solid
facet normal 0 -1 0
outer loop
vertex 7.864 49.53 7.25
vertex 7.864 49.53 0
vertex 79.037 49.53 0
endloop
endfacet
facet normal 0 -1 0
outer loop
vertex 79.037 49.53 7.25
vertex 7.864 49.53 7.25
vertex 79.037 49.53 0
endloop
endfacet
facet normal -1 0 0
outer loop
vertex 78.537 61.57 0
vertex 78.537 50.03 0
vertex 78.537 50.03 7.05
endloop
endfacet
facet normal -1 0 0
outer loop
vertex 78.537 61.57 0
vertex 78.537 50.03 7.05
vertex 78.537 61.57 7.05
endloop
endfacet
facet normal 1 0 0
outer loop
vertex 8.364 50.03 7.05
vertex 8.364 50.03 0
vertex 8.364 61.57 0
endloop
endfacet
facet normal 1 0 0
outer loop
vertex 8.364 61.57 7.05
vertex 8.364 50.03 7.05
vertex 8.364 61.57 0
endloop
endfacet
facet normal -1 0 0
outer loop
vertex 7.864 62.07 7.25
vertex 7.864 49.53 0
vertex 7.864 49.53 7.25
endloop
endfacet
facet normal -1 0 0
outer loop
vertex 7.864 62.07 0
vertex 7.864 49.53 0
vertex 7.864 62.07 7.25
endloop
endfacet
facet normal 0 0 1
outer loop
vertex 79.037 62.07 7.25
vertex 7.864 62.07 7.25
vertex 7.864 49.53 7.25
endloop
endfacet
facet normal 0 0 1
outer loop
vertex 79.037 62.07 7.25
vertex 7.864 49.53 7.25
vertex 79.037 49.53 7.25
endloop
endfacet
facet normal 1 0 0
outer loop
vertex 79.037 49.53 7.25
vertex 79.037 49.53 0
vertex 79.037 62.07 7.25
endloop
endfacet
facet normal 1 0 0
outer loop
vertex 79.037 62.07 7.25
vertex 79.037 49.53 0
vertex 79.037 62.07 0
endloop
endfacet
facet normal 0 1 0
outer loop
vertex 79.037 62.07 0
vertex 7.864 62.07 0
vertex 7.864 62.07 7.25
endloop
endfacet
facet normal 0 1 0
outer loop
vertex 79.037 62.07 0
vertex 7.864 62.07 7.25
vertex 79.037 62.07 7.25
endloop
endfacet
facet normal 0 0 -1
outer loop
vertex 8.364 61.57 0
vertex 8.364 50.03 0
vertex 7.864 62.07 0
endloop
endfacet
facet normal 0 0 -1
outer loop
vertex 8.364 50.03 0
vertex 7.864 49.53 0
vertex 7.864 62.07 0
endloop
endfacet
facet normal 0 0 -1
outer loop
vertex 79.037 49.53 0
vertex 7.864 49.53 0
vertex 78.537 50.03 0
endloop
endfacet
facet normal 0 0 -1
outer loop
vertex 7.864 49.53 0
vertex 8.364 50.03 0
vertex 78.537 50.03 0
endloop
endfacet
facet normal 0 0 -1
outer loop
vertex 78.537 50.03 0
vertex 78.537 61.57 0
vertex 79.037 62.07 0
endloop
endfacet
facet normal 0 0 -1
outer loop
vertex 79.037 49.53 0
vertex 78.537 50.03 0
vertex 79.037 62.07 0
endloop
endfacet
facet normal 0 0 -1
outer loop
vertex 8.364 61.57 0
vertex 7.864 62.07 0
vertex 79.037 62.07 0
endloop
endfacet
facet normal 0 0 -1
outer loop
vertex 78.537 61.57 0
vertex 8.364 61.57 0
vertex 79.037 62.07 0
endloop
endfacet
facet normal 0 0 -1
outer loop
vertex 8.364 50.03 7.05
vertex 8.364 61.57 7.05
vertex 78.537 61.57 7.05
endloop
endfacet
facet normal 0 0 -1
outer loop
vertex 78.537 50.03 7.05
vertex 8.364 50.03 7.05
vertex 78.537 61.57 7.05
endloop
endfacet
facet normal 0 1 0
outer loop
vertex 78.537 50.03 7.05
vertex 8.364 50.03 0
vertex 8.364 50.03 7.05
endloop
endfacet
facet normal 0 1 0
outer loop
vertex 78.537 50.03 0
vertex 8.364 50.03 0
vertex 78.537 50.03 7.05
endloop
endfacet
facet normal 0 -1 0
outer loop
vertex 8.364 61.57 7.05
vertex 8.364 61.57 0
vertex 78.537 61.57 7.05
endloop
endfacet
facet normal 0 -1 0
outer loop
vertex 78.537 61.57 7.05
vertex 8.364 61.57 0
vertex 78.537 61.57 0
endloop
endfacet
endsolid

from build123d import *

# Parameters (mm, degrees)
SKETCH1_W                 = 71.17230149
SKETCH1_H                 = 12.54
BOSS_EXTRUDE1_DEPTH       = 7.25
SHELL1_T                  = -0.5
SHELL1_THICKNESS_2_FACE_W = 70.17230149
SHELL1_THICKNESS_2_FACE_H = 11.54
SHELL1_THICKNESS_2_DEPTH  = 0.3


with BuildPart() as part:
    # Sketch1 → Boss-Extrude1 (new body)
    with BuildSketch(Plane.XY):
        with Locations((43.450650745, 55.8)):
            Rectangle(SKETCH1_W, SKETCH1_H)
    extrude(amount=BOSS_EXTRUDE1_DEPTH)

    # Shell1
    shell1_openings = [part.faces().sort_by_distance(p)[0] for p in [
        (43.450650745, 55.8, 0),
    ]]
    offset(amount=SHELL1_T, openings=shell1_openings, kind=Kind.INTERSECTION)

    # Shell1 thickness 2 face (on inner face of the shell) → Shell1 thickness 2 (cut)
    with BuildSketch(Plane(origin=(43.450650745, 55.8, 6.75), x_dir=(1, 0, 0), z_dir=(0, 0, 1))):
        Rectangle(SHELL1_THICKNESS_2_FACE_W, SHELL1_THICKNESS_2_FACE_H)
    extrude(amount=SHELL1_THICKNESS_2_DEPTH, mode=Mode.SUBTRACT)


solid = part.part
